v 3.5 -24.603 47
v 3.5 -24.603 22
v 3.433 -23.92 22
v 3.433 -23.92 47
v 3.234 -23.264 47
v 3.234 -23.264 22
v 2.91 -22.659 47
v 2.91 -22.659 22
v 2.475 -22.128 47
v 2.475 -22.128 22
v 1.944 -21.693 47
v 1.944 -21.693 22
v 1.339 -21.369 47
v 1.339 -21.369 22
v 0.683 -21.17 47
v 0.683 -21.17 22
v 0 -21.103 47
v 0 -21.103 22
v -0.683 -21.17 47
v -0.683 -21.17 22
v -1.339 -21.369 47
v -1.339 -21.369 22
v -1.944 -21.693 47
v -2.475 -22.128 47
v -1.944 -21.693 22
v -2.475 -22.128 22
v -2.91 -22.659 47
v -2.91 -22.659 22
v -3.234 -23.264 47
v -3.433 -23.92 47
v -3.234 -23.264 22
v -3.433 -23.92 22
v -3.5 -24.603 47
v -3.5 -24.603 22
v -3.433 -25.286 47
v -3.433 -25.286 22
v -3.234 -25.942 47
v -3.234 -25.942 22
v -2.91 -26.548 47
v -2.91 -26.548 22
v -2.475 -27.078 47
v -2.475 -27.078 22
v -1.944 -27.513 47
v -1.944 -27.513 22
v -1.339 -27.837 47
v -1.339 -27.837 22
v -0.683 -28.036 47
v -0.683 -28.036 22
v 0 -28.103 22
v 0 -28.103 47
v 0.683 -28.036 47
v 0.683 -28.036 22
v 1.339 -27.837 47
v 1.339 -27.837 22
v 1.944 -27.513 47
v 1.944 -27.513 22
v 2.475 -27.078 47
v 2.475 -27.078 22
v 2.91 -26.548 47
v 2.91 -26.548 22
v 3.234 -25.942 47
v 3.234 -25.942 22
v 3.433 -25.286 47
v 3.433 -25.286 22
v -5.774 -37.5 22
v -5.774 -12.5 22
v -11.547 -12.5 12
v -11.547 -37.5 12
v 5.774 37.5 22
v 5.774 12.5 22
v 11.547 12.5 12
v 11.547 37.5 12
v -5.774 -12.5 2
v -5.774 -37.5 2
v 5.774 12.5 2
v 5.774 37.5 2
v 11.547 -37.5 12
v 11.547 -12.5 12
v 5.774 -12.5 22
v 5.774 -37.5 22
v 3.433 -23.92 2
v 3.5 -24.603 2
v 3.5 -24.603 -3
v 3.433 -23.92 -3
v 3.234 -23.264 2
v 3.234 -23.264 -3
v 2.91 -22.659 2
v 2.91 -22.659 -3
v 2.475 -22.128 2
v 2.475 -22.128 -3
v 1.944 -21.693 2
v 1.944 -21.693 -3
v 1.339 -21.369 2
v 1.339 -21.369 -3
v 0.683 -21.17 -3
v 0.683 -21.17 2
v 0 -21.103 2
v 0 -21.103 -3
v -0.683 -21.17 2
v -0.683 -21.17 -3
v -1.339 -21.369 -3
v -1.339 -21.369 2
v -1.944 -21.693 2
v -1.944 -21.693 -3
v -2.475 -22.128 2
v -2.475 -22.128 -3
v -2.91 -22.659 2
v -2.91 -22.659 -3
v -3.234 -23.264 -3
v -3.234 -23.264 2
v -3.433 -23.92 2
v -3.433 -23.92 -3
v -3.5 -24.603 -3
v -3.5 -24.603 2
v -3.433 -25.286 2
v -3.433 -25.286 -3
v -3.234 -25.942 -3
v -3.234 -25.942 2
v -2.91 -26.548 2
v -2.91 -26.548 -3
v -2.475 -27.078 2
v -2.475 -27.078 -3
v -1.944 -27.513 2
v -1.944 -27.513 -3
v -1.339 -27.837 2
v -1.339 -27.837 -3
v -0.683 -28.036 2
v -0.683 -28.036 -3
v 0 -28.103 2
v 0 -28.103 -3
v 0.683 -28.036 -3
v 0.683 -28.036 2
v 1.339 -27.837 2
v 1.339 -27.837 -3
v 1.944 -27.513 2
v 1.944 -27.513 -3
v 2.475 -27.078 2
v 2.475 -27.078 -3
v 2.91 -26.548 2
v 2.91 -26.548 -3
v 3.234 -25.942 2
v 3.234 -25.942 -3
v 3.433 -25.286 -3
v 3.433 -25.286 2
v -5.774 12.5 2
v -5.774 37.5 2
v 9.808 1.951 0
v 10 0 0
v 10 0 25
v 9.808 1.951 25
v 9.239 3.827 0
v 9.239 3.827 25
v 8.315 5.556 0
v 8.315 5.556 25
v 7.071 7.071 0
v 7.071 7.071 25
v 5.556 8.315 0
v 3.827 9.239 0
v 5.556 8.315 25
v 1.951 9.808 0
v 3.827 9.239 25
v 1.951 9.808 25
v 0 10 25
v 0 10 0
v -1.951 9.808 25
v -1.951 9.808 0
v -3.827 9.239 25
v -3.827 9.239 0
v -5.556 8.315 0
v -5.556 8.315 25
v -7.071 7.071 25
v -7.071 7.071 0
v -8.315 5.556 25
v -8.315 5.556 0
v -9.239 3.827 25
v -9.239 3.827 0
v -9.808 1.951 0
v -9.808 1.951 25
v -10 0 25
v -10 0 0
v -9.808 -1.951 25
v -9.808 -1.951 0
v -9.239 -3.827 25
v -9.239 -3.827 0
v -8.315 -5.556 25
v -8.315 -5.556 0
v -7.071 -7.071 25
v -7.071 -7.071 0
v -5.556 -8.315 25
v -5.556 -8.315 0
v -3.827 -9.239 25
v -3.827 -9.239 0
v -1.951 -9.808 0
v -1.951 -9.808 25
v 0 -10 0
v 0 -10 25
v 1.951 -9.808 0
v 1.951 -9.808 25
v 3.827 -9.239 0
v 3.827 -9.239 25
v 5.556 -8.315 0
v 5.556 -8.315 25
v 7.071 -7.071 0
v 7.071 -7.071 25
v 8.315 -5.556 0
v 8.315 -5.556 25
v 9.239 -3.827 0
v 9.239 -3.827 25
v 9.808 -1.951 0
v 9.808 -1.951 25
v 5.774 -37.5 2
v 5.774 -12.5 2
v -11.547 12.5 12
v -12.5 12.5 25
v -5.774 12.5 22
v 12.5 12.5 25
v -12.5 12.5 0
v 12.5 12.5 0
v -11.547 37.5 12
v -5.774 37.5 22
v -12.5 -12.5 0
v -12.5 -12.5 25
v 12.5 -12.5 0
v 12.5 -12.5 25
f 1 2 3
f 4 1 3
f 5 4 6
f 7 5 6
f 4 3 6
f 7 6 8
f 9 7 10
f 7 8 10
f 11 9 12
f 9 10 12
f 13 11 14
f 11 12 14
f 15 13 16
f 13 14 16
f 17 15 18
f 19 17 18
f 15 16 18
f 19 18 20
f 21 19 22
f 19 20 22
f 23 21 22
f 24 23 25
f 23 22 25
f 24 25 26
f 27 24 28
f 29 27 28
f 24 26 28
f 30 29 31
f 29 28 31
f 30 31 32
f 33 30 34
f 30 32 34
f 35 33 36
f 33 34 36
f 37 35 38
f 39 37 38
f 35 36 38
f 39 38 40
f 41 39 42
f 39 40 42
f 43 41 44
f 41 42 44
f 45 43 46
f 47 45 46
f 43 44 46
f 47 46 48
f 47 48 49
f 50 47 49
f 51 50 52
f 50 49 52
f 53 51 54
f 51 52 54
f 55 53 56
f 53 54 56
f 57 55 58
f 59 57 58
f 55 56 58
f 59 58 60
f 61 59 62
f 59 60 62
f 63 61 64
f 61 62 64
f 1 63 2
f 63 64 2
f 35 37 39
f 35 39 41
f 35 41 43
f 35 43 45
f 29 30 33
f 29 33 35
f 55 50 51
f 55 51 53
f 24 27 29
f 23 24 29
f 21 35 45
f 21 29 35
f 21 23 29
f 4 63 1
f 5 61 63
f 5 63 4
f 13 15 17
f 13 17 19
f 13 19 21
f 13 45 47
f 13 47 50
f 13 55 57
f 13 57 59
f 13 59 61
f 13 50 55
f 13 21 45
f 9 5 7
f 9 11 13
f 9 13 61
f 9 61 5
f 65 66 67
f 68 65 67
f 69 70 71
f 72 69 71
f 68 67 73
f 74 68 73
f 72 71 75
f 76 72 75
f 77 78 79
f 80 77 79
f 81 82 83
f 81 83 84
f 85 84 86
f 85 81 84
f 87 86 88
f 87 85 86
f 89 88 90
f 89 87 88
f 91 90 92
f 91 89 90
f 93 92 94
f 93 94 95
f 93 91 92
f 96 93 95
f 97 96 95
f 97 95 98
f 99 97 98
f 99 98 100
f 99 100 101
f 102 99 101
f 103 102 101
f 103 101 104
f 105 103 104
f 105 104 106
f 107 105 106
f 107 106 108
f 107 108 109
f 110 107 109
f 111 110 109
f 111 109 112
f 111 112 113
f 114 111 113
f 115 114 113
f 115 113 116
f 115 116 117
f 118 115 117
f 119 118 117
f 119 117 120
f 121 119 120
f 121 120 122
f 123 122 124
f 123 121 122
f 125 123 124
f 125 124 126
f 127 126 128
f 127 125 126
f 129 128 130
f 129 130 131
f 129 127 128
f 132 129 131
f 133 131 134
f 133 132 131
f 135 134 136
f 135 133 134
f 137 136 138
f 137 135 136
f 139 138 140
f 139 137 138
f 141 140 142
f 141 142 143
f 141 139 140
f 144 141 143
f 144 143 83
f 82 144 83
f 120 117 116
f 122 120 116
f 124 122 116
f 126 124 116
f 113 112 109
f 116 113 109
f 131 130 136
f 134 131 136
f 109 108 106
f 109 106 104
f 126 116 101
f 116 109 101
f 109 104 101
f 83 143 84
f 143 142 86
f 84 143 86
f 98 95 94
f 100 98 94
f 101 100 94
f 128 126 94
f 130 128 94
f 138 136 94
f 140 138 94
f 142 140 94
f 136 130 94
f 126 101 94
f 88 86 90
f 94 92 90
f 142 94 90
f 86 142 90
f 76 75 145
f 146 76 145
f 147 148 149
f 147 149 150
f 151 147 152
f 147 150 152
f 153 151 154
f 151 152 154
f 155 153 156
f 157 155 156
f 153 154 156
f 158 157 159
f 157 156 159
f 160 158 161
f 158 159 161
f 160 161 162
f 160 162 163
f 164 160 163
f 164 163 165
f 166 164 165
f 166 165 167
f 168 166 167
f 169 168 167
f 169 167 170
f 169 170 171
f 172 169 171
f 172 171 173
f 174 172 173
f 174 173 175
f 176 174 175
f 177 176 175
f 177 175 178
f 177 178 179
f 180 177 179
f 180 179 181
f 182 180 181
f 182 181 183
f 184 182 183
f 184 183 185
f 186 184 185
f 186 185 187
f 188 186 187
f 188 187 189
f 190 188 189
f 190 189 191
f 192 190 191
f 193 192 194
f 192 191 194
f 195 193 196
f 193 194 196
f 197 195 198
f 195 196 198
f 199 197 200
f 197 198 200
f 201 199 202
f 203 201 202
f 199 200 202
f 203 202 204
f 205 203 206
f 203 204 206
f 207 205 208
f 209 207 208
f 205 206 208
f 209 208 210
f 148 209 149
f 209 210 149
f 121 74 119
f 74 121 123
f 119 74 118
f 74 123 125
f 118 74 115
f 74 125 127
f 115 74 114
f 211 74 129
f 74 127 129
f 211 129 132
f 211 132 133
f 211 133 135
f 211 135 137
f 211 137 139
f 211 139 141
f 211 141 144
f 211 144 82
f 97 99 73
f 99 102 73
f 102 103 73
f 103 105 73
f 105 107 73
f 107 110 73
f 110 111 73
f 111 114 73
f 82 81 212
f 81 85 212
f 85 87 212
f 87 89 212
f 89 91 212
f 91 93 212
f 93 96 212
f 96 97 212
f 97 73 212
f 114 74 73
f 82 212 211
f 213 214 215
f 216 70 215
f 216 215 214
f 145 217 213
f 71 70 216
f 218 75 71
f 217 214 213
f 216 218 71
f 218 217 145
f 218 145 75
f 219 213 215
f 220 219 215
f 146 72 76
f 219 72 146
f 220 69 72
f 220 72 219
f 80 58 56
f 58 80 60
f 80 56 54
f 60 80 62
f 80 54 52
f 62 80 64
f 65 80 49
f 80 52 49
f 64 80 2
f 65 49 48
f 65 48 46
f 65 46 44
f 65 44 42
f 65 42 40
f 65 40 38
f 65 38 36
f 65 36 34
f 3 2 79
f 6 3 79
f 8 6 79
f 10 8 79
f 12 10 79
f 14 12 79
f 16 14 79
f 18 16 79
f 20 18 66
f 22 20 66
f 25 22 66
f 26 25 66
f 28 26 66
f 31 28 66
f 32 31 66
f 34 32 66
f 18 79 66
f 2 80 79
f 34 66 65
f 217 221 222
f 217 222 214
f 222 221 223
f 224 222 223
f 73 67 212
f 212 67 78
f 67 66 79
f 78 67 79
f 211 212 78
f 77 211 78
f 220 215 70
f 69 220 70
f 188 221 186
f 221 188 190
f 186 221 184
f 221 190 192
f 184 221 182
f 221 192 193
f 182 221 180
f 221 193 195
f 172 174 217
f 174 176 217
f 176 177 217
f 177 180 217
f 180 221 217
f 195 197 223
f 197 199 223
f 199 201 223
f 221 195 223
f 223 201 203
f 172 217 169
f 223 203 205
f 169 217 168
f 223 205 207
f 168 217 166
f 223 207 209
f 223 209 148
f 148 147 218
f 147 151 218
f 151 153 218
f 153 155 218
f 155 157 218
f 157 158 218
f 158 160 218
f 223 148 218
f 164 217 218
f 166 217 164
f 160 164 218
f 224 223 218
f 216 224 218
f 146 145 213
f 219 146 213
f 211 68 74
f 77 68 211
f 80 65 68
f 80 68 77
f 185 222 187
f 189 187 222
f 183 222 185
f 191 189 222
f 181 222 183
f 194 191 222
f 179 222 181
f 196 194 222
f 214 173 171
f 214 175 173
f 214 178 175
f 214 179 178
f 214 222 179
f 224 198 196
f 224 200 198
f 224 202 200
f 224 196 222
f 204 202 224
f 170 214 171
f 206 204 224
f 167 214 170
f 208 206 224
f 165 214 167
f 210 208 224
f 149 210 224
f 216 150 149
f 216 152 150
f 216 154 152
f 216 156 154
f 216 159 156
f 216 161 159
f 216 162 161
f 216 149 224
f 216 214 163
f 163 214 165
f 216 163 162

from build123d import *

# Parameters (mm, degrees)
F0_W          = 25
F0_H          = 25
F1_DEPTH      = 25
F2_R          = 10
F3_DEPTH      = 25.001
F5_DEPTH      = 25
F7_DEPTH      = 25
F8_R          = 3.5
F9_DEPTH      = 25
F9_DEPTH_BACK = 25


with BuildPart() as f1:
    # F0 (on Top) → F1 (new body)
    with BuildSketch(Plane.XY):
        Rectangle(F0_W, F0_H)
    extrude(amount=F1_DEPTH)

    # F2 (on face) → F3 (cut, through all)
    with BuildSketch(Plane.XY.offset(25)):
        Circle(F2_R)
    extrude(amount=-F3_DEPTH, mode=Mode.SUBTRACT)

    # F4 (on face) → F5 (join)
    with BuildSketch(Plane(origin=(0, 12.5, 0), x_dir=(-1, 0, 0), z_dir=(0, 1, 0))):
        Polygon((-11.547005, 12), (-5.773503, 2), (5.773503, 2), (11.547005, 12), (5.773503, 22), (-5.773503, 22), align=None)
    extrude(amount=F5_DEPTH)


with BuildPart() as f7:
    # F6 (on face) → F7 (new body)
    with BuildSketch(Plane.XZ.offset(12.5)):
        Polygon((5.773503, 2), (11.547005, 12), (5.773503, 22), (-5.773503, 22), (-11.547005, 12), (-5.773503, 2), align=None)
    extrude(amount=F7_DEPTH)

    # F8 (on face) → F9 (join, two sides)
    with BuildSketch(Plane.XY.offset(22)) as f9_sk:
        with Locations((0, -24.60302)):
            Circle(F8_R)
    extrude(amount=F9_DEPTH)
    extrude(f9_sk.sketch, amount=-F9_DEPTH_BACK)


solid = Compound([f1.part, f7.part])
